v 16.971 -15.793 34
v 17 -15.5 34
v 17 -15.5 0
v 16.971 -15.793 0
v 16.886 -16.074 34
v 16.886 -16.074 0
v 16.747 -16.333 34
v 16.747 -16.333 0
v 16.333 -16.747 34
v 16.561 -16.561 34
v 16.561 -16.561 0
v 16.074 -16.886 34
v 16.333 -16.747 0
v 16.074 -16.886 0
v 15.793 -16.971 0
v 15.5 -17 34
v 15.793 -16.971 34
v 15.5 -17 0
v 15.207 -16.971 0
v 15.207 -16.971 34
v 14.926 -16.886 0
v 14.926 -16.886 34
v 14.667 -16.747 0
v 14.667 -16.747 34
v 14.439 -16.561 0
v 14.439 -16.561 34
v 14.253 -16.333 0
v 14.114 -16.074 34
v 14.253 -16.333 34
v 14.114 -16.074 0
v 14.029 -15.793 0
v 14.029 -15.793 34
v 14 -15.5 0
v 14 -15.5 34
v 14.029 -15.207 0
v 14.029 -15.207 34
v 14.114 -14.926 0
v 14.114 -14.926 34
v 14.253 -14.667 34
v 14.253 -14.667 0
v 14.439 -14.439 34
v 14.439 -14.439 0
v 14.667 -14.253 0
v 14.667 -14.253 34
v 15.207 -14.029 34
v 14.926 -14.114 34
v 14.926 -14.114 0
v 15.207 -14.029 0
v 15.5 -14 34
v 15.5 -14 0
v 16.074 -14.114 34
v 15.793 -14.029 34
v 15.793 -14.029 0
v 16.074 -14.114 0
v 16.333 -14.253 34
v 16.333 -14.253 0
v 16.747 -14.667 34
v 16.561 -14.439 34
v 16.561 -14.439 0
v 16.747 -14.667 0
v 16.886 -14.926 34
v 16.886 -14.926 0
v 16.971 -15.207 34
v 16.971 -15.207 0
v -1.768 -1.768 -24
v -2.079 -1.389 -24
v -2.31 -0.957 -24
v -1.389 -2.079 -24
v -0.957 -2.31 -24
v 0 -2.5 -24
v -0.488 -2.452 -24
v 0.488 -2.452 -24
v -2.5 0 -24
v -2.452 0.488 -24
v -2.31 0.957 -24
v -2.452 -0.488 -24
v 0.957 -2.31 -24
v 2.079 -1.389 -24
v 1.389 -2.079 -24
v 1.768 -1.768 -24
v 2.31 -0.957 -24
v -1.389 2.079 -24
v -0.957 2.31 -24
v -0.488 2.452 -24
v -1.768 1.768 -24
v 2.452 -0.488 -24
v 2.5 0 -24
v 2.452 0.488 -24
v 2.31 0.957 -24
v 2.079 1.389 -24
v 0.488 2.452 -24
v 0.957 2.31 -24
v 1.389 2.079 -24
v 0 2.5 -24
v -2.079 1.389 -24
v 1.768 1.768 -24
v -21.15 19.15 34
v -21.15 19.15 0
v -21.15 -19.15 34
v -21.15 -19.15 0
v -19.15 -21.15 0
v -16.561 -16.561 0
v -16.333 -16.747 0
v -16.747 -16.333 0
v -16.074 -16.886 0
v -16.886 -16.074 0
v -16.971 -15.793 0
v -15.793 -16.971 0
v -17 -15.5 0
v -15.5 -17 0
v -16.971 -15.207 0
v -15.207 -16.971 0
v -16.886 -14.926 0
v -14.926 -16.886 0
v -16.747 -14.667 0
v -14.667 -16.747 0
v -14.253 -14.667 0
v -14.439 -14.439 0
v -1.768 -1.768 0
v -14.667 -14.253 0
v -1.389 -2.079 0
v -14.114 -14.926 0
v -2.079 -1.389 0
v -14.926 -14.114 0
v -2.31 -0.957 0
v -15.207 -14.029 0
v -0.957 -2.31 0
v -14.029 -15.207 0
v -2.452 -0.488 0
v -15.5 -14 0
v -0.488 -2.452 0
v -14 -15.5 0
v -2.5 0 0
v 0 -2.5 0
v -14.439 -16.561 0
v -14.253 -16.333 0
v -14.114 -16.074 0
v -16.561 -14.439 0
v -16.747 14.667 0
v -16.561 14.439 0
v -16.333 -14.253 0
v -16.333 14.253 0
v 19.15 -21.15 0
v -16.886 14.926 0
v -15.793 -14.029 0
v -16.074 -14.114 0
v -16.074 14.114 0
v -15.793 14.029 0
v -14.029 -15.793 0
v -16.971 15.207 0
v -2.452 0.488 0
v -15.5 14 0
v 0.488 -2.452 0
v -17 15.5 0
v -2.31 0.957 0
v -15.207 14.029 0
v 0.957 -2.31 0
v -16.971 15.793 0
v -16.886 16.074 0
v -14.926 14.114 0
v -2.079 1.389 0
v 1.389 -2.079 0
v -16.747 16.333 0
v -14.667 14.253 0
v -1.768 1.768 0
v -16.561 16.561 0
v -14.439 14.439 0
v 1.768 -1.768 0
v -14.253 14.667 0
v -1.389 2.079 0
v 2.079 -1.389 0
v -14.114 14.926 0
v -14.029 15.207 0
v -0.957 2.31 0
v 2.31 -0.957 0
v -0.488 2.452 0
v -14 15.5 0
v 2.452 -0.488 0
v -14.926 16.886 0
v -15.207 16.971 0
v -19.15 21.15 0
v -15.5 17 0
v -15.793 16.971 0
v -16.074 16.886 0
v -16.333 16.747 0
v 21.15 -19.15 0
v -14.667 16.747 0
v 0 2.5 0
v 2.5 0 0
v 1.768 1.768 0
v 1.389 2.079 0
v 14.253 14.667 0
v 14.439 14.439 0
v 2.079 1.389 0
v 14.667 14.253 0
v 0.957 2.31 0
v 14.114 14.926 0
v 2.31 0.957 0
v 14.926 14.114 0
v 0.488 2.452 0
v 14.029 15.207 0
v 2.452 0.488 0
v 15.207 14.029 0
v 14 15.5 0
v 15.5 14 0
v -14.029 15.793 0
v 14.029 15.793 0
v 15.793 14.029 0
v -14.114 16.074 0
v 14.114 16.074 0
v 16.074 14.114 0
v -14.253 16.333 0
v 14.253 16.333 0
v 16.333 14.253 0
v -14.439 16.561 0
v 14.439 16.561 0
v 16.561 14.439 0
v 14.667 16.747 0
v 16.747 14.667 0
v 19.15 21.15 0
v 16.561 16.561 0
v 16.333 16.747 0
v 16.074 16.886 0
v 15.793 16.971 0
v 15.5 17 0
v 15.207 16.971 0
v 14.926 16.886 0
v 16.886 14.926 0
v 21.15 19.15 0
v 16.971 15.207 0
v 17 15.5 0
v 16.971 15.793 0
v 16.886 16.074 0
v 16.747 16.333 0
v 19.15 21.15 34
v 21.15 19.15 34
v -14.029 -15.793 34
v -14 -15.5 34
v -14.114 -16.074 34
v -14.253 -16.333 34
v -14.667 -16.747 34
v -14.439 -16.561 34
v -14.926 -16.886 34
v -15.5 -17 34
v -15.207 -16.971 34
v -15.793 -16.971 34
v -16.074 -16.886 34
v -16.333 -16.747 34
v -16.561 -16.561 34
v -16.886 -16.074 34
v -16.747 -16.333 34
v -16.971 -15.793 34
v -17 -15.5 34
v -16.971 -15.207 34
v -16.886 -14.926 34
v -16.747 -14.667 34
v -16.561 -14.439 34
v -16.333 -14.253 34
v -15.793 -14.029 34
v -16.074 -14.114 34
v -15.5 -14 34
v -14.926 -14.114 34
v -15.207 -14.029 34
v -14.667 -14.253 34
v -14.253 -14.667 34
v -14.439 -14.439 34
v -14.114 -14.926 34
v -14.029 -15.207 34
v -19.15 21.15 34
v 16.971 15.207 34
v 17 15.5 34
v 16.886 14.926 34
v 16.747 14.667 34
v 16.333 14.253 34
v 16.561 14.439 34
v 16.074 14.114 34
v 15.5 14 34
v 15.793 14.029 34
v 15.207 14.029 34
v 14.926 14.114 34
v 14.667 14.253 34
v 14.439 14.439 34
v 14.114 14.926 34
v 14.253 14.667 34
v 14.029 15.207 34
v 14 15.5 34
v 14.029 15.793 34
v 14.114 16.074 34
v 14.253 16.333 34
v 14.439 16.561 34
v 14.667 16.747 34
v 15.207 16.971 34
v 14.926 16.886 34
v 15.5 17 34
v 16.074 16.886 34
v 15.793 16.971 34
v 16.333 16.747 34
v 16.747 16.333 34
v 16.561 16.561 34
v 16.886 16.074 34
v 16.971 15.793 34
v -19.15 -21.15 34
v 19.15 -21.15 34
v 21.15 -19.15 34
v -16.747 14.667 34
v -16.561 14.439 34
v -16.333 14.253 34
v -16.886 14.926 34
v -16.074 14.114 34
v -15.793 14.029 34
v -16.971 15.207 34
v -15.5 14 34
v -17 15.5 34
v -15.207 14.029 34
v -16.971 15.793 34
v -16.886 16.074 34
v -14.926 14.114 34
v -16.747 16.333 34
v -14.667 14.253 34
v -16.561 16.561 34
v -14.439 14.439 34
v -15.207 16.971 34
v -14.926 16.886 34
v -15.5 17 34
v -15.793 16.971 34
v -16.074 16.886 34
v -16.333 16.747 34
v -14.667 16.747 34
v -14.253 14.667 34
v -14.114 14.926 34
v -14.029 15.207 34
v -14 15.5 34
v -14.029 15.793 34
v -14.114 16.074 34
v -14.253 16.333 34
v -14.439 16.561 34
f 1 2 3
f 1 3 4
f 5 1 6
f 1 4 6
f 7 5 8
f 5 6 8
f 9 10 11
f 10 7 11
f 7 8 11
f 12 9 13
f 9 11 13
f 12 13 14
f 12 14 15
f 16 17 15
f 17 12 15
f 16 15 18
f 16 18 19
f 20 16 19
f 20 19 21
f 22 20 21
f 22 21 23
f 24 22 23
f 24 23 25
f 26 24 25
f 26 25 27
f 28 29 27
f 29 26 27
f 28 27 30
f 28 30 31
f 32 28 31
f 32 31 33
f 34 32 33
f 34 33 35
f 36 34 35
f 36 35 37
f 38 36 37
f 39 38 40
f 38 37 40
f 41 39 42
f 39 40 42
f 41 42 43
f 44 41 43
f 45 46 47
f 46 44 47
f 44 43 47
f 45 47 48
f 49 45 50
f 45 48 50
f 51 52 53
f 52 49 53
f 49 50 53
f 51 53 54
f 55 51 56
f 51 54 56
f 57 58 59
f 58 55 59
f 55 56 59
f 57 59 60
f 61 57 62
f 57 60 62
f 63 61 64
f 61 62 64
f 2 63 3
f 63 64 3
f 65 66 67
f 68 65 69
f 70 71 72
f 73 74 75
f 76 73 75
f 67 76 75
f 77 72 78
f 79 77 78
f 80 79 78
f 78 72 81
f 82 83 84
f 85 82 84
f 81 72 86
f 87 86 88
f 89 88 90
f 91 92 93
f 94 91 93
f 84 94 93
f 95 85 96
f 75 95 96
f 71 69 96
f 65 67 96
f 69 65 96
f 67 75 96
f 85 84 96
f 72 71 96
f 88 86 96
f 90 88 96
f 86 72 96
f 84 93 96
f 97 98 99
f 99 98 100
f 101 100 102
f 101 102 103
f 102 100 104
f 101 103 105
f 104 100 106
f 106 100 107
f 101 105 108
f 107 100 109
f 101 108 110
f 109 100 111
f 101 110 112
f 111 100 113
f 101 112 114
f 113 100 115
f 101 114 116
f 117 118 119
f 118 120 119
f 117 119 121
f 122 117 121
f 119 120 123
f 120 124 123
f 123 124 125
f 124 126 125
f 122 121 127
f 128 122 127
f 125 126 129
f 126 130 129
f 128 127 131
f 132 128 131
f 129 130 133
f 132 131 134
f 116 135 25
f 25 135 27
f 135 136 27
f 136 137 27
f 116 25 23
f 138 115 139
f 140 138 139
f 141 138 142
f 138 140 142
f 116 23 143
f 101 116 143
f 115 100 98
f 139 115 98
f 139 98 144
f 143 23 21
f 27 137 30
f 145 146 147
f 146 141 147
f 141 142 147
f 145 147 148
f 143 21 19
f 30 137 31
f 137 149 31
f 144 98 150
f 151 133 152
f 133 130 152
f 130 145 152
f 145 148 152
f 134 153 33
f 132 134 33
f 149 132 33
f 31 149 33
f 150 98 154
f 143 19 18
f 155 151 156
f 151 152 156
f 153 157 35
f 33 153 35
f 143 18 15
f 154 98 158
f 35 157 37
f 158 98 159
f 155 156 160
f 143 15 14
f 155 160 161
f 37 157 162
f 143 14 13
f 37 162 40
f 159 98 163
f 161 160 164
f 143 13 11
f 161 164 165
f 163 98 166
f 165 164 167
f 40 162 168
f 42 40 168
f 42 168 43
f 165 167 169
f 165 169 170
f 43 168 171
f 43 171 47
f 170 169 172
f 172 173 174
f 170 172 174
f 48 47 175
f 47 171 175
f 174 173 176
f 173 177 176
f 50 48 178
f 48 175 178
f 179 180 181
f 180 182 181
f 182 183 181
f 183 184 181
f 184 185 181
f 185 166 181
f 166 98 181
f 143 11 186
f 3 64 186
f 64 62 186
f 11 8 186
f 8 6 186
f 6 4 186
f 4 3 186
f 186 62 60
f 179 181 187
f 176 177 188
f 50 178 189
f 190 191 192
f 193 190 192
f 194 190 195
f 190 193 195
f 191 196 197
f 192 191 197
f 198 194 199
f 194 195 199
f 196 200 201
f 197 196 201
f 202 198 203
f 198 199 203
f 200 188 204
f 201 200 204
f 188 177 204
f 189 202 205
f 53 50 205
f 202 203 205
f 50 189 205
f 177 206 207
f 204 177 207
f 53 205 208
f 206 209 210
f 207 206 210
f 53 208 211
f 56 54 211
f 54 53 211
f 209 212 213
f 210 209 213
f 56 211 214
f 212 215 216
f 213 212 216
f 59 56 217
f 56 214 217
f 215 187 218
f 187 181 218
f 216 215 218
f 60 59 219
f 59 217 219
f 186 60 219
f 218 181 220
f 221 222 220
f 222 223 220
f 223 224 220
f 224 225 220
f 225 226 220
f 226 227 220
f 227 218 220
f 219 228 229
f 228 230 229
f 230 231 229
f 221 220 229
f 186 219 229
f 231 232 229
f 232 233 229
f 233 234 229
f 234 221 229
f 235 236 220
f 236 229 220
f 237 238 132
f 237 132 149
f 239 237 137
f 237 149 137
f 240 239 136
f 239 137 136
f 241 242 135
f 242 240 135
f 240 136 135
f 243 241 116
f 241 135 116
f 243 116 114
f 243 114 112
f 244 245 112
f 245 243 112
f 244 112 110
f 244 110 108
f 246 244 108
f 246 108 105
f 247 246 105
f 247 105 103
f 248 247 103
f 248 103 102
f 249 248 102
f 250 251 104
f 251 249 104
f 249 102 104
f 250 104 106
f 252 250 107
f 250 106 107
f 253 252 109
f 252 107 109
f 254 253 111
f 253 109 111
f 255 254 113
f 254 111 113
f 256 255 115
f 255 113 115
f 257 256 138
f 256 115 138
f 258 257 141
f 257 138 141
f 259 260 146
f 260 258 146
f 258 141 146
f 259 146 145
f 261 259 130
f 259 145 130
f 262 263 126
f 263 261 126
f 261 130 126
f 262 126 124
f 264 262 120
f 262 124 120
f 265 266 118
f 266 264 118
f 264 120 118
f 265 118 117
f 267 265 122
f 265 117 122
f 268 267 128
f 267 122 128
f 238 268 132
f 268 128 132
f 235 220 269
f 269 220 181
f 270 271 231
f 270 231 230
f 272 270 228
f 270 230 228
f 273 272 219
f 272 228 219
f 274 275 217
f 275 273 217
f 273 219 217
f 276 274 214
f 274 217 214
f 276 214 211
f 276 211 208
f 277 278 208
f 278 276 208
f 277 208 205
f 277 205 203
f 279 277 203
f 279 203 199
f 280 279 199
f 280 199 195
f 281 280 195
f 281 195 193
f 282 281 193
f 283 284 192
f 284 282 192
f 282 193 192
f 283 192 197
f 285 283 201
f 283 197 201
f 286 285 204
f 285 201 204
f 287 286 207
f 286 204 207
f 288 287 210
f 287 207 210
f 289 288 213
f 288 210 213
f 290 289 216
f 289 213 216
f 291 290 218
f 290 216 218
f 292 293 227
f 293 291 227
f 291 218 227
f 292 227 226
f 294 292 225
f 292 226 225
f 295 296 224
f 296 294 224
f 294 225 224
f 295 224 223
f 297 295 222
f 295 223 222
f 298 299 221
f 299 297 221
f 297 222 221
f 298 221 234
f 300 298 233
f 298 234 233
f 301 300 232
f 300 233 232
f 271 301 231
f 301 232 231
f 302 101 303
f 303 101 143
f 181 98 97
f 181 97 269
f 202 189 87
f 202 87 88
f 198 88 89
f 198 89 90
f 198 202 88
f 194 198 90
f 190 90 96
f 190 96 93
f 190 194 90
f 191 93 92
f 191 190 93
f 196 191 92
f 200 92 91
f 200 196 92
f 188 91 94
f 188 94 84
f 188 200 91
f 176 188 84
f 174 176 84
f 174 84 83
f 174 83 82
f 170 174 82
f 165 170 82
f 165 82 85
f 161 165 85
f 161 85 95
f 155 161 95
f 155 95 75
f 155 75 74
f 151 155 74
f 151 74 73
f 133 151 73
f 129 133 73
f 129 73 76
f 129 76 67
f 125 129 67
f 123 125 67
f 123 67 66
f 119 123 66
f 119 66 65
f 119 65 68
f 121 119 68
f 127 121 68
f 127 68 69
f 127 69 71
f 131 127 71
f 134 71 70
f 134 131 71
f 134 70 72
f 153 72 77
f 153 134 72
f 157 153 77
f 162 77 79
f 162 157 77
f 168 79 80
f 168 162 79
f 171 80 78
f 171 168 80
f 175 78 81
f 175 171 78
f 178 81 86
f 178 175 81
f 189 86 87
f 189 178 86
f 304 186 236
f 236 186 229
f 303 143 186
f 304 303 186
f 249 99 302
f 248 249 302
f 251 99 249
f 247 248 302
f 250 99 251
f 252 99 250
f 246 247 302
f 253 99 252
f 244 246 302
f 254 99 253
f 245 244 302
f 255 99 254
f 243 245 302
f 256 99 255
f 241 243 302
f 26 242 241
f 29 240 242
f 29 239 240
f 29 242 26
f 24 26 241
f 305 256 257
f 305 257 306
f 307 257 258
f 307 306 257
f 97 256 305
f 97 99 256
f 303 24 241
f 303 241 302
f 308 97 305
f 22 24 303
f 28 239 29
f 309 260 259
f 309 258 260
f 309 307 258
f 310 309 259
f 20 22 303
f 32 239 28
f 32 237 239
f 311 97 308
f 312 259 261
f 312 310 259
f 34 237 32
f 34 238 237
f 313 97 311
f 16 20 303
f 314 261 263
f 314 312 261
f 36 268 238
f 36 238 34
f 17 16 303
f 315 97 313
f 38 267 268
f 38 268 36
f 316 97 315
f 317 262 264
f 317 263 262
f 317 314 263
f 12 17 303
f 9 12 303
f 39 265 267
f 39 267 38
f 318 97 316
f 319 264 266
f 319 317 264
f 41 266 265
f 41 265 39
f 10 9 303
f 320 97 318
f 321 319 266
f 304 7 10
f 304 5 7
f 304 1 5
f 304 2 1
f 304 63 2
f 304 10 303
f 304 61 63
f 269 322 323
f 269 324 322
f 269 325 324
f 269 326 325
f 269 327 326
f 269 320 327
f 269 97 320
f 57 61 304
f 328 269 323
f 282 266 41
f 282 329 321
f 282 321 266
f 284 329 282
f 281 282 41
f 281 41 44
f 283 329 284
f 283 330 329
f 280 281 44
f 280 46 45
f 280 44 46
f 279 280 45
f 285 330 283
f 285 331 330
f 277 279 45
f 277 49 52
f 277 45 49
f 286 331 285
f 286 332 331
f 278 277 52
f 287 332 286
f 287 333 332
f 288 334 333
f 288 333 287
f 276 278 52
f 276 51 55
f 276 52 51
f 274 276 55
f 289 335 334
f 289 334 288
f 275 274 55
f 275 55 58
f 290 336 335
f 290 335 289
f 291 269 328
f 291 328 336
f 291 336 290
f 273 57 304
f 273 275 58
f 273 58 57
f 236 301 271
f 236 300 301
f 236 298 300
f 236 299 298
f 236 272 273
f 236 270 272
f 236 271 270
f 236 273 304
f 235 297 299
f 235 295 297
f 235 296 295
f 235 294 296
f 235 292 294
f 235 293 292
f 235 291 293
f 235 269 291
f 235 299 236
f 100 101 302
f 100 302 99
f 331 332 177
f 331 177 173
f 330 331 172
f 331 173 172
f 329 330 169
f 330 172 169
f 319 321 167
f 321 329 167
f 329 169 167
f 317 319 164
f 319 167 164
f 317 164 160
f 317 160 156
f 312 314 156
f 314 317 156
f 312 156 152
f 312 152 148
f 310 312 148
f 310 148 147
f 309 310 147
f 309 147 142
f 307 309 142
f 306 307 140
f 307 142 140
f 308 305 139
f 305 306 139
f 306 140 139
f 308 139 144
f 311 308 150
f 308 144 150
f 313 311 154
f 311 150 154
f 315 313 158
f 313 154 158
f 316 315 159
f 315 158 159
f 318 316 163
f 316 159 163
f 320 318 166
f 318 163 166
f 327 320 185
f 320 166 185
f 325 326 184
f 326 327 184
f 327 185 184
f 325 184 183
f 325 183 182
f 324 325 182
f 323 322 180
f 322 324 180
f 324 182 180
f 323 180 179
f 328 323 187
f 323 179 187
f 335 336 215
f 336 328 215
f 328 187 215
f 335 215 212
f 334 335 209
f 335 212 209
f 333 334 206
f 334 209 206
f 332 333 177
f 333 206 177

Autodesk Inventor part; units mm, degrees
ref_plane "YZ Plane" through (0, 0, 0) normal (1, 0, 0) x (0, 1, 0)
ref_plane "XZ Plane" through (0, 0, 0) normal (0, 1, 0) x (-1, 0, 0)
ref_plane "XY Plane" through (0, 0, 0) normal (0, 0, 1) x (1, 0, 0)
sketch "body" plane through (0, 0, 0) normal (0, 0, 1) x (1, 0, 0)
  line L0 (-19.15, -21.15) -> (19.15, -21.15)
  line L1 (21.15, -19.15) -> (21.15, 19.15)
  line L2 (19.15, 21.15) -> (-19.15, 21.15)
  line L3 (-21.15, 19.15) -> (-21.15, -19.15)
  line L4 (-21.15, -21.15) -> (21.15, 21.15) construction
  line L5 (21.15, -21.15) -> (-21.15, 21.15) construction
  line L6 (-19.15, -21.15) -> (-21.15, -19.15)
  line L7 (-21.15, 19.15) -> (-19.15, 21.15)
  line L8 (21.15, 19.15) -> (19.15, 21.15)
  line L9 (19.15, -21.15) -> (21.15, -19.15)
  circle A0 centre (-15.5, 15.5) radius 1.5
  circle A1 centre (15.5, 15.5) radius 1.5
  circle A2 centre (15.5, -15.5) radius 1.5
  circle A3 centre (-15.5, -15.5) radius 1.5
  point P0 (0, 0)
  dimension "d5" = 42.3
  dimension "d6" = 42.3
  dimension "d7" = 2
  dimension "d8" = 2
  dimension "d9" = 2
  dimension "d10" = 2
  dimension "d11" = 2
  dimension "d12" = 2
  dimension "d13" = 2
  dimension "d14" = 2
  dimension "d15" = 3
  dimension "d16" = 3
  dimension "d17" = 3
  dimension "d18" = 3
sketch "Sketch6" plane through (0, 0, 0) normal (0, 0, 1) x (1, 0, 0)
  circle A0 centre (0, 0) radius 2.5
  dimension "d19" = 5
extrude "Extrusion1" add sketch "body" along normal blind 34
extrude "Extrusion2" add sketch "Sketch6" against normal blind 24
equation "\"d8\" = d7"
equation "\"d10\" = d9"
equation "\"d11\" = d9"
equation "\"d12\" = d11"
equation "\"d13\" = d9"
equation "\"d14\" = d13"
properties part number "motor"
